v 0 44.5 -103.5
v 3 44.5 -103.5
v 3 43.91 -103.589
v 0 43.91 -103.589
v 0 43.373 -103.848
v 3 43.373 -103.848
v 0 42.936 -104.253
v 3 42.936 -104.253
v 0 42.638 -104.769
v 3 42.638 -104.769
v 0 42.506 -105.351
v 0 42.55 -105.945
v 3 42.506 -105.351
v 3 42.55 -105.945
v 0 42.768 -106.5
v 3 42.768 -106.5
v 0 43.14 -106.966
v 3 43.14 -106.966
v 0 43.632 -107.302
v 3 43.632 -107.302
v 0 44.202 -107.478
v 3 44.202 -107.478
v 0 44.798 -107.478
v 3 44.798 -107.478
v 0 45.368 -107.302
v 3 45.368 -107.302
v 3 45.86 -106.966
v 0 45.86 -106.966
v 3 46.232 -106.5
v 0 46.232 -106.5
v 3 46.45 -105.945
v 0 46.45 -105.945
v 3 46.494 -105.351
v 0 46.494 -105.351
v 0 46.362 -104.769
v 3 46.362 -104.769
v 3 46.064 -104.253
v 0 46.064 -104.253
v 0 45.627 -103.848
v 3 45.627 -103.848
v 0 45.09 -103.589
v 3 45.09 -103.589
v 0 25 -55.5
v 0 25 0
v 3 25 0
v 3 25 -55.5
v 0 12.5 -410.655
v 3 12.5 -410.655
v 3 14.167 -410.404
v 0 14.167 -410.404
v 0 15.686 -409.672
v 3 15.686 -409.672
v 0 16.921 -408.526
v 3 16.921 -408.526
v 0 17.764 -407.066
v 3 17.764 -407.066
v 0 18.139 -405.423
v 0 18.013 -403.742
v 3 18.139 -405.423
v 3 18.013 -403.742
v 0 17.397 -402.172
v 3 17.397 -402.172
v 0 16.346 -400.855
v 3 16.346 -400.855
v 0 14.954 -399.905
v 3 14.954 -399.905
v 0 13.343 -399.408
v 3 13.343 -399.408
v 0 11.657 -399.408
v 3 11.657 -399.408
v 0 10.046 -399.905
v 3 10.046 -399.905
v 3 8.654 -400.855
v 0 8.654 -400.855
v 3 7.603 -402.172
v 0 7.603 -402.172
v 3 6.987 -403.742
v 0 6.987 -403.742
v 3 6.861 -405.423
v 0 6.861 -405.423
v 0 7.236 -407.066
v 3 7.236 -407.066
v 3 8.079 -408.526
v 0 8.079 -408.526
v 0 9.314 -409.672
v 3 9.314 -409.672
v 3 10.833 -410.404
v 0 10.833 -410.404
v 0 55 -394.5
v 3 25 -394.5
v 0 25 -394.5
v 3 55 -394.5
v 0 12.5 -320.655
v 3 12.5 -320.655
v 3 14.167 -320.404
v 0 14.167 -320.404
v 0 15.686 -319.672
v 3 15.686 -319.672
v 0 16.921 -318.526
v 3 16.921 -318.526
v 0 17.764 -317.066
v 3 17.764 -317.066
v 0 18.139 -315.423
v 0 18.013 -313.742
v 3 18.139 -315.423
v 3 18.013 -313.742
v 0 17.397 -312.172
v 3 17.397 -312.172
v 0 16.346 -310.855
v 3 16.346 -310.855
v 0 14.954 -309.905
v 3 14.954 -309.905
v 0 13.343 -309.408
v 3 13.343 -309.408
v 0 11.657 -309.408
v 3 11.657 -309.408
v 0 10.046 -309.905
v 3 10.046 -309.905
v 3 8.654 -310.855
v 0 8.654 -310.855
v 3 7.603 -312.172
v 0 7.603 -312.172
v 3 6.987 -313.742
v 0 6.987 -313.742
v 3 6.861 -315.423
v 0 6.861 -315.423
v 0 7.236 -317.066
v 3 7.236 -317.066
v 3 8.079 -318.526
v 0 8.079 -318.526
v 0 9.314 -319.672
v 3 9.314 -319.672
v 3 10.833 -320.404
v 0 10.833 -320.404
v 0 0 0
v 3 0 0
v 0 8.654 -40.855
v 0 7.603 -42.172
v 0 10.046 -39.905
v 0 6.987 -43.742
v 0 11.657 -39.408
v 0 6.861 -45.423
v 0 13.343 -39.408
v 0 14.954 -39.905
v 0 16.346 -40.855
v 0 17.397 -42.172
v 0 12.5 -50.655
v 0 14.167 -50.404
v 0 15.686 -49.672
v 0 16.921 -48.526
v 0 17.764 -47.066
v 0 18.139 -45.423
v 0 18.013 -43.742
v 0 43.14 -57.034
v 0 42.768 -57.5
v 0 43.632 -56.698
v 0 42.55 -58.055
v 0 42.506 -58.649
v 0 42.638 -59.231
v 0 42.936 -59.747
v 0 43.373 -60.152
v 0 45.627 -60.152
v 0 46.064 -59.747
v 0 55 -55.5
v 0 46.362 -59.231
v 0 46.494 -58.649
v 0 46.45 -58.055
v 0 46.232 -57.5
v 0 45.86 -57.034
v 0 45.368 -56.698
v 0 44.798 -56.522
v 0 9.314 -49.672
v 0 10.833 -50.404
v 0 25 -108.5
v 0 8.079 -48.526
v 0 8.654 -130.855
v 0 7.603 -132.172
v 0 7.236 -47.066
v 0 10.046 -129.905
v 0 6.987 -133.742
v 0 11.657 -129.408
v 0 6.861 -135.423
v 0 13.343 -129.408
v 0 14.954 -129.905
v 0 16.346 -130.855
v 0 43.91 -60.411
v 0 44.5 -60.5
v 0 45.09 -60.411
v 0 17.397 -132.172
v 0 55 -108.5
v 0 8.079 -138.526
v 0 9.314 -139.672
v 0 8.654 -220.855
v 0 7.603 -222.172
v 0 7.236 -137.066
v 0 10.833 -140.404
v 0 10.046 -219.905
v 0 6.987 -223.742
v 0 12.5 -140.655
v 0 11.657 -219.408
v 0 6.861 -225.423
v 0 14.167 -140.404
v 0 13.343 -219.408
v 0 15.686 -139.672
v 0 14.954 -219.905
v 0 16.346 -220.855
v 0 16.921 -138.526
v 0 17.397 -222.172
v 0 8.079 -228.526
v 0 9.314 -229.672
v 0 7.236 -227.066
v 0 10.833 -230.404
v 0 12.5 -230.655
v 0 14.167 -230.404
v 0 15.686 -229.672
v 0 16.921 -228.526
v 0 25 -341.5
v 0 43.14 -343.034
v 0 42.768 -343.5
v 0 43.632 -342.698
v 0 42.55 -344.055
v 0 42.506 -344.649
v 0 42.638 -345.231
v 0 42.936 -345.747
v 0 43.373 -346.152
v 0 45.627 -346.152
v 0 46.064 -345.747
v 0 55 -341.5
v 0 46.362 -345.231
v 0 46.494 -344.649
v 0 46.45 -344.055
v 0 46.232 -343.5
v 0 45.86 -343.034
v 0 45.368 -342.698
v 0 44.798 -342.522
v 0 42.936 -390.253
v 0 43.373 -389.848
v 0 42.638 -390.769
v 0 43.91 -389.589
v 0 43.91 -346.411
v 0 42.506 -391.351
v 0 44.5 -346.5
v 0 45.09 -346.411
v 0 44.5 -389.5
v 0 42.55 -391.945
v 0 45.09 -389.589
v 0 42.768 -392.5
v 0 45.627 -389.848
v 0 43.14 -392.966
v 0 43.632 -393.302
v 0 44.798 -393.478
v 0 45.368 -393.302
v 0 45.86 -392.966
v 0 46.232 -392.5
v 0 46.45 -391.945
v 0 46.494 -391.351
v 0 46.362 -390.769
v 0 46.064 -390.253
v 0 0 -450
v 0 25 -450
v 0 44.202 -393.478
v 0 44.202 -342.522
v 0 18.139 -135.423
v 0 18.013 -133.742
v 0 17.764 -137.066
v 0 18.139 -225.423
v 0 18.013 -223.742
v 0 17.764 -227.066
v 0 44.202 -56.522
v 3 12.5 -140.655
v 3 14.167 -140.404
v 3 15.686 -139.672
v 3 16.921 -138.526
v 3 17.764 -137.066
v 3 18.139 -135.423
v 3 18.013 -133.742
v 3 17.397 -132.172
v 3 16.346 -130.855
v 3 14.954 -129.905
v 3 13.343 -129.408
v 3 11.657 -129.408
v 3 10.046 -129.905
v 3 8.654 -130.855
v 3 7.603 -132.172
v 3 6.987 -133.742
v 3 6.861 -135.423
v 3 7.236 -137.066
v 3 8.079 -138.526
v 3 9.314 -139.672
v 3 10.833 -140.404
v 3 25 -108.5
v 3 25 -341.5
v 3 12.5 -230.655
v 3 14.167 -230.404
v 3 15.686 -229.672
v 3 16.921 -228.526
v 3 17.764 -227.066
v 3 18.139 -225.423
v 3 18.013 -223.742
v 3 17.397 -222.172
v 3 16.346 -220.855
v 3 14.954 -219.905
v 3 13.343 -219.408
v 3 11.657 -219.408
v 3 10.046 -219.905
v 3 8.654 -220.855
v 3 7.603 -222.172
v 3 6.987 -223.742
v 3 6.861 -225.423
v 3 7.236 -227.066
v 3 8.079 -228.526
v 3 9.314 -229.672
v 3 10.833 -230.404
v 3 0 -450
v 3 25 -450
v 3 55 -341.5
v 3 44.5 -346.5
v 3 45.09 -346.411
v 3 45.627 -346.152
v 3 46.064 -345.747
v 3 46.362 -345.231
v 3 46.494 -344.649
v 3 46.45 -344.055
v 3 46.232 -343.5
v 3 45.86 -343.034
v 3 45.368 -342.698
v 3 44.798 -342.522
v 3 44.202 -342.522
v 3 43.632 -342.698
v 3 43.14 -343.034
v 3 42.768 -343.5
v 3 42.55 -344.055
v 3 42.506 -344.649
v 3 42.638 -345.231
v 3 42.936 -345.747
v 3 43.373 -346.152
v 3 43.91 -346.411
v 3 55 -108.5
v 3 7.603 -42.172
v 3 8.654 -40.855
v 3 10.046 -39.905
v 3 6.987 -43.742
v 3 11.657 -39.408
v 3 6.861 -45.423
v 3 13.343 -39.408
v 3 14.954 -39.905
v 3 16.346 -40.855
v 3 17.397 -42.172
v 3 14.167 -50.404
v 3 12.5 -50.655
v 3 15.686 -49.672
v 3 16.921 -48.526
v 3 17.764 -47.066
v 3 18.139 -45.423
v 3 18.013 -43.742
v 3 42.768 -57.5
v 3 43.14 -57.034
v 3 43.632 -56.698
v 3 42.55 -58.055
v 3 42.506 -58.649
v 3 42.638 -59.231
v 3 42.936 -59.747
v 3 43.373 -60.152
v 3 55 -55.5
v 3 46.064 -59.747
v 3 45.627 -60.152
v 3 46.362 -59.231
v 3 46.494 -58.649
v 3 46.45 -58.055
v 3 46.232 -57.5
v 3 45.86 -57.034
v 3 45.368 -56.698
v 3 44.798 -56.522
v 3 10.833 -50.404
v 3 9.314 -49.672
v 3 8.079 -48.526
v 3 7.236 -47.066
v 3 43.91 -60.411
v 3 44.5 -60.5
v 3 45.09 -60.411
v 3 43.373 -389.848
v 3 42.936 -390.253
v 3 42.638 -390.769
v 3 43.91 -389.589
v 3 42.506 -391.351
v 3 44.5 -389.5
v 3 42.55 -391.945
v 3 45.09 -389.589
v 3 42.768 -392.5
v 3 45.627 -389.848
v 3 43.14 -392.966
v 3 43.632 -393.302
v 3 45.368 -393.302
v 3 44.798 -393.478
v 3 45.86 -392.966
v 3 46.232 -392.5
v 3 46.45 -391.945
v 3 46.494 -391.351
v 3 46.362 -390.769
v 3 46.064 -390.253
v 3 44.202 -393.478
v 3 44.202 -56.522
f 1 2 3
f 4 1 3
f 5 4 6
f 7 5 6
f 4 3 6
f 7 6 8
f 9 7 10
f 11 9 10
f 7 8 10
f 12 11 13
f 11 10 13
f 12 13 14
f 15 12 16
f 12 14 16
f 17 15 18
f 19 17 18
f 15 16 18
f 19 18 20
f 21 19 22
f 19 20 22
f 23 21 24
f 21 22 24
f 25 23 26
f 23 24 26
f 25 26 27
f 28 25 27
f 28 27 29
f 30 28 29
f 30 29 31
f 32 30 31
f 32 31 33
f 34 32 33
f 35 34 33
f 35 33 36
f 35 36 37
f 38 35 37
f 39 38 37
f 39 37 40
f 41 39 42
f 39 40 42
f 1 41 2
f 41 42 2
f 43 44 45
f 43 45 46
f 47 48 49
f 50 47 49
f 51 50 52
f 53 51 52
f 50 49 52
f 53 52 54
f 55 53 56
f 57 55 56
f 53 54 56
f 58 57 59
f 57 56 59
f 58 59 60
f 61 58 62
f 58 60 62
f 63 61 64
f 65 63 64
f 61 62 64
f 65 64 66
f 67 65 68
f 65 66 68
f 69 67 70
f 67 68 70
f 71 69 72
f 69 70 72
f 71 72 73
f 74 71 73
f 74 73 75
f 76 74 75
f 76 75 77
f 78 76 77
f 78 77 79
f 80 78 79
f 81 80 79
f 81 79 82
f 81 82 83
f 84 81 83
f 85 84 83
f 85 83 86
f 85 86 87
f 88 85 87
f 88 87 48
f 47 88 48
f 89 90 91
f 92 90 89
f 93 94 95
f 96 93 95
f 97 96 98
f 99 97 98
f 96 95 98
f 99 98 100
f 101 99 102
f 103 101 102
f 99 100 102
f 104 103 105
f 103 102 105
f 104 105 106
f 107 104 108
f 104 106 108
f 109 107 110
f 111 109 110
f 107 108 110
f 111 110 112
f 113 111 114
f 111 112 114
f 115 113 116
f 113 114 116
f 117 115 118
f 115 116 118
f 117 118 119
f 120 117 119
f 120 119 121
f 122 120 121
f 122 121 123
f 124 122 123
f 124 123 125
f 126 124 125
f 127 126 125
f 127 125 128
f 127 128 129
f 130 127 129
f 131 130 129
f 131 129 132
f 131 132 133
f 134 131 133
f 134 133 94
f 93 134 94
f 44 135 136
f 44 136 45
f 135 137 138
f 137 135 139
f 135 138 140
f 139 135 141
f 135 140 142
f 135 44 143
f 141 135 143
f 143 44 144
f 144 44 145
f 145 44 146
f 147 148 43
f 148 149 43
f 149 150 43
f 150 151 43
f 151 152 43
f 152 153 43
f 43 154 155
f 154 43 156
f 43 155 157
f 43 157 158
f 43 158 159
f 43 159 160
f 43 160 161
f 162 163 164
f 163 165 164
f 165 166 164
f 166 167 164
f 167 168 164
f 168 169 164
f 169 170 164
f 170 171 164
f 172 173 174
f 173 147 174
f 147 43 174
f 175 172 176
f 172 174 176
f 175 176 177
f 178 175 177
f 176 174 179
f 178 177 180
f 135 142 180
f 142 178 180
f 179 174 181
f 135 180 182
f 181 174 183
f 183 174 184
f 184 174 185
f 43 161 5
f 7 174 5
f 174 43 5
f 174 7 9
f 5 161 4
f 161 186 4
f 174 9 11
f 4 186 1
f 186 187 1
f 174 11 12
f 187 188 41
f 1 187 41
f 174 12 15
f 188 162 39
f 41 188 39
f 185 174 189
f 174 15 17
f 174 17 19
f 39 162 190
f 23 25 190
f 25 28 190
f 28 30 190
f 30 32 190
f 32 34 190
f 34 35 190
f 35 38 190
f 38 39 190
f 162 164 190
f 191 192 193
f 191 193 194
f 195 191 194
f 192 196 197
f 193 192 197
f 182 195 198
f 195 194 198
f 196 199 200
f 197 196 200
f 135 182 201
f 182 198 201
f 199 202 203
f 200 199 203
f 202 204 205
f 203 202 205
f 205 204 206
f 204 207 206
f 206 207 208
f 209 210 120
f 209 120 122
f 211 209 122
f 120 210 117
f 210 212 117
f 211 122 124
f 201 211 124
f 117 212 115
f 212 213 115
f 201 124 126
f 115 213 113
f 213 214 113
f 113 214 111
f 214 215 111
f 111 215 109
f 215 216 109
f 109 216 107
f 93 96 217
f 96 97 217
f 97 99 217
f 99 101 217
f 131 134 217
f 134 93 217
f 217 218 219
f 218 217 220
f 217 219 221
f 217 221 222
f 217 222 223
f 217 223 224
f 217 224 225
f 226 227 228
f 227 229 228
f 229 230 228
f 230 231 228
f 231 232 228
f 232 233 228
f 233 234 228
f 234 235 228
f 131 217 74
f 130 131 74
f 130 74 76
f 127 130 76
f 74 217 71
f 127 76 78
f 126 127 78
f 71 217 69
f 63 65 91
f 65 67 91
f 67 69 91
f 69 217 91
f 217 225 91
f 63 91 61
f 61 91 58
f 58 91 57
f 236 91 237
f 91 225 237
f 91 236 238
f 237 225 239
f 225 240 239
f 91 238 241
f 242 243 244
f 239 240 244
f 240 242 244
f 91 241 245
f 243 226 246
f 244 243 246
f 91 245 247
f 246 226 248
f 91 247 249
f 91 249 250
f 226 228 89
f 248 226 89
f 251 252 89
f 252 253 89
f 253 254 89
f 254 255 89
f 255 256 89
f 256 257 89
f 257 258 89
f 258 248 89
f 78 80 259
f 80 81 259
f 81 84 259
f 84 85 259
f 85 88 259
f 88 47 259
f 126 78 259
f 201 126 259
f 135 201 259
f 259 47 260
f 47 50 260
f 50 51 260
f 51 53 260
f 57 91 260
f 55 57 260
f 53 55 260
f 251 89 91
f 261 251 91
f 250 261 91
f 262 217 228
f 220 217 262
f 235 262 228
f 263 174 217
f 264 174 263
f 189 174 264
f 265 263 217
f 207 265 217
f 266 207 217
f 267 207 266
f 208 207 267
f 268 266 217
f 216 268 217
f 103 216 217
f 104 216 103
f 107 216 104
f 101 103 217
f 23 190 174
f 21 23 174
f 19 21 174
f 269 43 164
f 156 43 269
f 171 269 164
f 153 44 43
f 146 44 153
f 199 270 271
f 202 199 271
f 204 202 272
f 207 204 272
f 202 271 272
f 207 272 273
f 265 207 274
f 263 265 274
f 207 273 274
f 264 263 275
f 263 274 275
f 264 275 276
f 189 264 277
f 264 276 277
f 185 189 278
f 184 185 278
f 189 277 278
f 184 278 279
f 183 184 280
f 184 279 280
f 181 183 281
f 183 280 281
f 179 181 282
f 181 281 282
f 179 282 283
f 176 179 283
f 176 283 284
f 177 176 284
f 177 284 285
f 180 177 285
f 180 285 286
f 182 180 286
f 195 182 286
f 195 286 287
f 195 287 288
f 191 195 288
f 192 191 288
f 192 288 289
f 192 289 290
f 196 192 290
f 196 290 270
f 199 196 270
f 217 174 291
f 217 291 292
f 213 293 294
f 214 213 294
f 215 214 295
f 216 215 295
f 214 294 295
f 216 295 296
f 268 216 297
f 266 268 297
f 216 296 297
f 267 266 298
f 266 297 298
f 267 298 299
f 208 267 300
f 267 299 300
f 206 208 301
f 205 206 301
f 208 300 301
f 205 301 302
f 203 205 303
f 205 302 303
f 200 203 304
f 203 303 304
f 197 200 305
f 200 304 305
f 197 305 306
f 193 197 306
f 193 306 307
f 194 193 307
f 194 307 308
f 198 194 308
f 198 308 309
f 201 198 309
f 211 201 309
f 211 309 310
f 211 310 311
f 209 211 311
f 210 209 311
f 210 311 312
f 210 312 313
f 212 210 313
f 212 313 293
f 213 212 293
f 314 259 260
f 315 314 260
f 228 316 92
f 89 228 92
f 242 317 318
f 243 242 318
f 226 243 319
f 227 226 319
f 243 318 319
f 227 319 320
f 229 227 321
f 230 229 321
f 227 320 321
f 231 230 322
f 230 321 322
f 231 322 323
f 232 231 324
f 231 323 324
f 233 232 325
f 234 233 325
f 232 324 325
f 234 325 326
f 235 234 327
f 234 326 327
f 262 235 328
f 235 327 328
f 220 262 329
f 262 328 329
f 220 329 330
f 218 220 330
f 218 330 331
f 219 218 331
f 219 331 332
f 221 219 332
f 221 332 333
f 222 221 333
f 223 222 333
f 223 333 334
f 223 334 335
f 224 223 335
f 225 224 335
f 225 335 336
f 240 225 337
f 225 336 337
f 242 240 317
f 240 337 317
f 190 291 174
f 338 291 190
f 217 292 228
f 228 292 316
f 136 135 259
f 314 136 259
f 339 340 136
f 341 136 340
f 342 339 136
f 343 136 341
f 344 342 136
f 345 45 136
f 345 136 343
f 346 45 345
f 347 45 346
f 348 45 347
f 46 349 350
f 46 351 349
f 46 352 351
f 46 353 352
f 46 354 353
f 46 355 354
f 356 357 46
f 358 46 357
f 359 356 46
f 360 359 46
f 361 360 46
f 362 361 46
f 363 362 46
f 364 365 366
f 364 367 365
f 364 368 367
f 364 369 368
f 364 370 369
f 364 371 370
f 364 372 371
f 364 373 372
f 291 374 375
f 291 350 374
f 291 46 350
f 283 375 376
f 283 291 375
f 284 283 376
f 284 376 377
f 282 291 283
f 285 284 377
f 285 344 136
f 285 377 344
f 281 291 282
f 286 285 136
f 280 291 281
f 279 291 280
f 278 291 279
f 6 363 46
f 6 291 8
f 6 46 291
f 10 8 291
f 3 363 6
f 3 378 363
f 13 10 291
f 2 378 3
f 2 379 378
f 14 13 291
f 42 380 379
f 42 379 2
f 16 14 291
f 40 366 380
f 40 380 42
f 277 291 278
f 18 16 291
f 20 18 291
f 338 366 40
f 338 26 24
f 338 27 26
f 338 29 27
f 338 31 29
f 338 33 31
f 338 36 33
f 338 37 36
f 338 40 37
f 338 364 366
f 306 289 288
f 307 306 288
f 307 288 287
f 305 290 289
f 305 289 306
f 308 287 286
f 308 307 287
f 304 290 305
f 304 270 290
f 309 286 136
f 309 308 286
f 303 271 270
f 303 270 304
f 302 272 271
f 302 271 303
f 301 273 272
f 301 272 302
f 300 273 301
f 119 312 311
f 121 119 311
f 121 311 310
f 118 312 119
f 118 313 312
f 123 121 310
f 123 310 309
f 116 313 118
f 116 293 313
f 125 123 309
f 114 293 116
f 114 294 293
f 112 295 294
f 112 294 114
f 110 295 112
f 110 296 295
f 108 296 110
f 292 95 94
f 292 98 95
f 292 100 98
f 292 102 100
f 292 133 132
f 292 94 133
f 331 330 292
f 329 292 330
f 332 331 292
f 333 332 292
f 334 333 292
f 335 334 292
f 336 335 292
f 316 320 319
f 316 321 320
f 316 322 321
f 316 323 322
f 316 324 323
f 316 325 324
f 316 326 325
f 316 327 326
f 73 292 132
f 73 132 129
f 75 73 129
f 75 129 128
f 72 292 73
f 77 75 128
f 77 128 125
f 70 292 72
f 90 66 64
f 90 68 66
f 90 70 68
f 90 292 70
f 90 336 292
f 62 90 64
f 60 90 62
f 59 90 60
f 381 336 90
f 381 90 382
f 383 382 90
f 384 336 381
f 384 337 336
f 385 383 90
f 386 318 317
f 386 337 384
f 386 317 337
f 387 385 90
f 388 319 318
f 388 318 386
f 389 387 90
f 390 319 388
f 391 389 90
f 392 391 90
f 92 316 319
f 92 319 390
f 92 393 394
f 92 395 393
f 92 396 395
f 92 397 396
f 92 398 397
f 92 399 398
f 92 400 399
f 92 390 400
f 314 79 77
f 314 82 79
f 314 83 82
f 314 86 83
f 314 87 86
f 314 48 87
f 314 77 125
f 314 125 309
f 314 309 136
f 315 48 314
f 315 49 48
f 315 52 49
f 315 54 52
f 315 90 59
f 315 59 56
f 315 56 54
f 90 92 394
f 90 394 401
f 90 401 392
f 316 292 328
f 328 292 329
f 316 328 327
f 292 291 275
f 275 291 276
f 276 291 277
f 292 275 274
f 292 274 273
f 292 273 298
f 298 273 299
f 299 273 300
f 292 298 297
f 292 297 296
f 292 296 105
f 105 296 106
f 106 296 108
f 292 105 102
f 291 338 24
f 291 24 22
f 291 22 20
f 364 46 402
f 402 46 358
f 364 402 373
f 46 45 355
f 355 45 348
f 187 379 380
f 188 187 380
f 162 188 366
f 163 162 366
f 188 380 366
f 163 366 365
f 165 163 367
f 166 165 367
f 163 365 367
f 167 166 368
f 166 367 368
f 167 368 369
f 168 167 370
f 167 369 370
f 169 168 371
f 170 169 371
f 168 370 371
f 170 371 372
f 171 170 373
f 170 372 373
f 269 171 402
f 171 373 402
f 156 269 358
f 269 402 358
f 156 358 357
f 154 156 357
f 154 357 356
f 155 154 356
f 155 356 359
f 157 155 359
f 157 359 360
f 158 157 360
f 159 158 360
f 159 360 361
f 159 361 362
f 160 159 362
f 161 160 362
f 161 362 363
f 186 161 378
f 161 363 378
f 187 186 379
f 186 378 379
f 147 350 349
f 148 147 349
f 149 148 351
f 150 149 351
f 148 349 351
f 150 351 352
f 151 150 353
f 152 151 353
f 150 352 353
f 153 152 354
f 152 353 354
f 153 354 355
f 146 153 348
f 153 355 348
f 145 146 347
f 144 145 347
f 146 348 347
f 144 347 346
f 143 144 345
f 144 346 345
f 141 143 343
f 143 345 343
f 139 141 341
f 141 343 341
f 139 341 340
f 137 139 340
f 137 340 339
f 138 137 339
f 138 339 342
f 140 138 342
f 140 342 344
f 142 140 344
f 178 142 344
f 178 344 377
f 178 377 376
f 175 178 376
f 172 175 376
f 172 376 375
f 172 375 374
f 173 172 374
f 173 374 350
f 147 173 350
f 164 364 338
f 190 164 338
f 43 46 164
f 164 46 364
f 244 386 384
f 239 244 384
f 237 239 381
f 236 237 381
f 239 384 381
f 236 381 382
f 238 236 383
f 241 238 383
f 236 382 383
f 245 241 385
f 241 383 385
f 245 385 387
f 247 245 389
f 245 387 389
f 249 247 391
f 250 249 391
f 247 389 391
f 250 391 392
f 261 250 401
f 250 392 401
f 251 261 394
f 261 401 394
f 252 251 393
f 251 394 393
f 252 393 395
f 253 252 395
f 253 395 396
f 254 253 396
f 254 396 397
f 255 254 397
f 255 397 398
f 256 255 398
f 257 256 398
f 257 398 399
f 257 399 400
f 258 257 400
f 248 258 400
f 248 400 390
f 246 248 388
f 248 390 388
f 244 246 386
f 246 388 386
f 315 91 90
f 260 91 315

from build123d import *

# Parameters (mm, degrees)
SKETCH_1_W          = 450
SKETCH_1_H          = 25
EXTRUDE_1_DEPTH     = 3
SKETCH_2_W          = 53
SKETCH_2_H          = 30
SKETCH_2_R          = 2
EXTRUDE_2_DEPTH     = 3
SKETCH_3_R          = 5.655027455
CUT_EXTRUDE_1_DEPTH = 454.358577728


with BuildPart() as part:
    # 草图1 → 凸台-拉伸1 (new body)
    with BuildSketch(Plane(origin=(0, 0, 0), x_dir=(0, 0, -1), z_dir=(1, 0, 0))):
        with Locations((225, 12.5)):
            Rectangle(SKETCH_1_W, SKETCH_1_H)
    extrude(amount=EXTRUDE_1_DEPTH)

    # 草图2 → 凸台-拉伸2 (add)
    # profile 1 of 2: a face of its own
    with BuildSketch(Plane(origin=(3, 0, 0), x_dir=(0, 0, -1), z_dir=(1, 0, 0))):
        with Locations((82, 40)):
            Rectangle(SKETCH_2_W, SKETCH_2_H)
        with Locations((58.5, 44.5)):
            Circle(SKETCH_2_R, mode=Mode.SUBTRACT)
        with Locations(Location((105.5, 44.5, 0), (0, 0, 180))):
            Circle(SKETCH_2_R, mode=Mode.SUBTRACT)
    # profile 2 of 2: a face of its own
    with BuildSketch(Plane(origin=(3, 0, 0), x_dir=(0, 0, -1), z_dir=(1, 0, 0))):
        with Locations((368, 40)):
            Rectangle(SKETCH_2_W, SKETCH_2_H)
        with Locations((344.5, 44.5)):
            Circle(SKETCH_2_R, mode=Mode.SUBTRACT)
        with Locations(Location((391.5, 44.5, 0), (0, 0, 180))):
            Circle(SKETCH_2_R, mode=Mode.SUBTRACT)
    extrude(amount=-EXTRUDE_2_DEPTH)

    # 草图3 → 切除-拉伸1 (cut, through all)
    with BuildSketch(Plane(origin=(3, 0, 0), x_dir=(0, 0, -1), z_dir=(1, 0, 0))):
        with Locations((225, 12.5)):
            Circle(SKETCH_3_R)
        with Locations((315, 12.5)):
            Circle(SKETCH_3_R)
        with Locations((405, 12.5)):
            Circle(SKETCH_3_R)
        with Locations((135, 12.5)):
            Circle(SKETCH_3_R)
        with Locations((45, 12.5)):
            Circle(SKETCH_3_R)
    extrude(amount=-CUT_EXTRUDE_1_DEPTH, mode=Mode.SUBTRACT)


solid = part.part
